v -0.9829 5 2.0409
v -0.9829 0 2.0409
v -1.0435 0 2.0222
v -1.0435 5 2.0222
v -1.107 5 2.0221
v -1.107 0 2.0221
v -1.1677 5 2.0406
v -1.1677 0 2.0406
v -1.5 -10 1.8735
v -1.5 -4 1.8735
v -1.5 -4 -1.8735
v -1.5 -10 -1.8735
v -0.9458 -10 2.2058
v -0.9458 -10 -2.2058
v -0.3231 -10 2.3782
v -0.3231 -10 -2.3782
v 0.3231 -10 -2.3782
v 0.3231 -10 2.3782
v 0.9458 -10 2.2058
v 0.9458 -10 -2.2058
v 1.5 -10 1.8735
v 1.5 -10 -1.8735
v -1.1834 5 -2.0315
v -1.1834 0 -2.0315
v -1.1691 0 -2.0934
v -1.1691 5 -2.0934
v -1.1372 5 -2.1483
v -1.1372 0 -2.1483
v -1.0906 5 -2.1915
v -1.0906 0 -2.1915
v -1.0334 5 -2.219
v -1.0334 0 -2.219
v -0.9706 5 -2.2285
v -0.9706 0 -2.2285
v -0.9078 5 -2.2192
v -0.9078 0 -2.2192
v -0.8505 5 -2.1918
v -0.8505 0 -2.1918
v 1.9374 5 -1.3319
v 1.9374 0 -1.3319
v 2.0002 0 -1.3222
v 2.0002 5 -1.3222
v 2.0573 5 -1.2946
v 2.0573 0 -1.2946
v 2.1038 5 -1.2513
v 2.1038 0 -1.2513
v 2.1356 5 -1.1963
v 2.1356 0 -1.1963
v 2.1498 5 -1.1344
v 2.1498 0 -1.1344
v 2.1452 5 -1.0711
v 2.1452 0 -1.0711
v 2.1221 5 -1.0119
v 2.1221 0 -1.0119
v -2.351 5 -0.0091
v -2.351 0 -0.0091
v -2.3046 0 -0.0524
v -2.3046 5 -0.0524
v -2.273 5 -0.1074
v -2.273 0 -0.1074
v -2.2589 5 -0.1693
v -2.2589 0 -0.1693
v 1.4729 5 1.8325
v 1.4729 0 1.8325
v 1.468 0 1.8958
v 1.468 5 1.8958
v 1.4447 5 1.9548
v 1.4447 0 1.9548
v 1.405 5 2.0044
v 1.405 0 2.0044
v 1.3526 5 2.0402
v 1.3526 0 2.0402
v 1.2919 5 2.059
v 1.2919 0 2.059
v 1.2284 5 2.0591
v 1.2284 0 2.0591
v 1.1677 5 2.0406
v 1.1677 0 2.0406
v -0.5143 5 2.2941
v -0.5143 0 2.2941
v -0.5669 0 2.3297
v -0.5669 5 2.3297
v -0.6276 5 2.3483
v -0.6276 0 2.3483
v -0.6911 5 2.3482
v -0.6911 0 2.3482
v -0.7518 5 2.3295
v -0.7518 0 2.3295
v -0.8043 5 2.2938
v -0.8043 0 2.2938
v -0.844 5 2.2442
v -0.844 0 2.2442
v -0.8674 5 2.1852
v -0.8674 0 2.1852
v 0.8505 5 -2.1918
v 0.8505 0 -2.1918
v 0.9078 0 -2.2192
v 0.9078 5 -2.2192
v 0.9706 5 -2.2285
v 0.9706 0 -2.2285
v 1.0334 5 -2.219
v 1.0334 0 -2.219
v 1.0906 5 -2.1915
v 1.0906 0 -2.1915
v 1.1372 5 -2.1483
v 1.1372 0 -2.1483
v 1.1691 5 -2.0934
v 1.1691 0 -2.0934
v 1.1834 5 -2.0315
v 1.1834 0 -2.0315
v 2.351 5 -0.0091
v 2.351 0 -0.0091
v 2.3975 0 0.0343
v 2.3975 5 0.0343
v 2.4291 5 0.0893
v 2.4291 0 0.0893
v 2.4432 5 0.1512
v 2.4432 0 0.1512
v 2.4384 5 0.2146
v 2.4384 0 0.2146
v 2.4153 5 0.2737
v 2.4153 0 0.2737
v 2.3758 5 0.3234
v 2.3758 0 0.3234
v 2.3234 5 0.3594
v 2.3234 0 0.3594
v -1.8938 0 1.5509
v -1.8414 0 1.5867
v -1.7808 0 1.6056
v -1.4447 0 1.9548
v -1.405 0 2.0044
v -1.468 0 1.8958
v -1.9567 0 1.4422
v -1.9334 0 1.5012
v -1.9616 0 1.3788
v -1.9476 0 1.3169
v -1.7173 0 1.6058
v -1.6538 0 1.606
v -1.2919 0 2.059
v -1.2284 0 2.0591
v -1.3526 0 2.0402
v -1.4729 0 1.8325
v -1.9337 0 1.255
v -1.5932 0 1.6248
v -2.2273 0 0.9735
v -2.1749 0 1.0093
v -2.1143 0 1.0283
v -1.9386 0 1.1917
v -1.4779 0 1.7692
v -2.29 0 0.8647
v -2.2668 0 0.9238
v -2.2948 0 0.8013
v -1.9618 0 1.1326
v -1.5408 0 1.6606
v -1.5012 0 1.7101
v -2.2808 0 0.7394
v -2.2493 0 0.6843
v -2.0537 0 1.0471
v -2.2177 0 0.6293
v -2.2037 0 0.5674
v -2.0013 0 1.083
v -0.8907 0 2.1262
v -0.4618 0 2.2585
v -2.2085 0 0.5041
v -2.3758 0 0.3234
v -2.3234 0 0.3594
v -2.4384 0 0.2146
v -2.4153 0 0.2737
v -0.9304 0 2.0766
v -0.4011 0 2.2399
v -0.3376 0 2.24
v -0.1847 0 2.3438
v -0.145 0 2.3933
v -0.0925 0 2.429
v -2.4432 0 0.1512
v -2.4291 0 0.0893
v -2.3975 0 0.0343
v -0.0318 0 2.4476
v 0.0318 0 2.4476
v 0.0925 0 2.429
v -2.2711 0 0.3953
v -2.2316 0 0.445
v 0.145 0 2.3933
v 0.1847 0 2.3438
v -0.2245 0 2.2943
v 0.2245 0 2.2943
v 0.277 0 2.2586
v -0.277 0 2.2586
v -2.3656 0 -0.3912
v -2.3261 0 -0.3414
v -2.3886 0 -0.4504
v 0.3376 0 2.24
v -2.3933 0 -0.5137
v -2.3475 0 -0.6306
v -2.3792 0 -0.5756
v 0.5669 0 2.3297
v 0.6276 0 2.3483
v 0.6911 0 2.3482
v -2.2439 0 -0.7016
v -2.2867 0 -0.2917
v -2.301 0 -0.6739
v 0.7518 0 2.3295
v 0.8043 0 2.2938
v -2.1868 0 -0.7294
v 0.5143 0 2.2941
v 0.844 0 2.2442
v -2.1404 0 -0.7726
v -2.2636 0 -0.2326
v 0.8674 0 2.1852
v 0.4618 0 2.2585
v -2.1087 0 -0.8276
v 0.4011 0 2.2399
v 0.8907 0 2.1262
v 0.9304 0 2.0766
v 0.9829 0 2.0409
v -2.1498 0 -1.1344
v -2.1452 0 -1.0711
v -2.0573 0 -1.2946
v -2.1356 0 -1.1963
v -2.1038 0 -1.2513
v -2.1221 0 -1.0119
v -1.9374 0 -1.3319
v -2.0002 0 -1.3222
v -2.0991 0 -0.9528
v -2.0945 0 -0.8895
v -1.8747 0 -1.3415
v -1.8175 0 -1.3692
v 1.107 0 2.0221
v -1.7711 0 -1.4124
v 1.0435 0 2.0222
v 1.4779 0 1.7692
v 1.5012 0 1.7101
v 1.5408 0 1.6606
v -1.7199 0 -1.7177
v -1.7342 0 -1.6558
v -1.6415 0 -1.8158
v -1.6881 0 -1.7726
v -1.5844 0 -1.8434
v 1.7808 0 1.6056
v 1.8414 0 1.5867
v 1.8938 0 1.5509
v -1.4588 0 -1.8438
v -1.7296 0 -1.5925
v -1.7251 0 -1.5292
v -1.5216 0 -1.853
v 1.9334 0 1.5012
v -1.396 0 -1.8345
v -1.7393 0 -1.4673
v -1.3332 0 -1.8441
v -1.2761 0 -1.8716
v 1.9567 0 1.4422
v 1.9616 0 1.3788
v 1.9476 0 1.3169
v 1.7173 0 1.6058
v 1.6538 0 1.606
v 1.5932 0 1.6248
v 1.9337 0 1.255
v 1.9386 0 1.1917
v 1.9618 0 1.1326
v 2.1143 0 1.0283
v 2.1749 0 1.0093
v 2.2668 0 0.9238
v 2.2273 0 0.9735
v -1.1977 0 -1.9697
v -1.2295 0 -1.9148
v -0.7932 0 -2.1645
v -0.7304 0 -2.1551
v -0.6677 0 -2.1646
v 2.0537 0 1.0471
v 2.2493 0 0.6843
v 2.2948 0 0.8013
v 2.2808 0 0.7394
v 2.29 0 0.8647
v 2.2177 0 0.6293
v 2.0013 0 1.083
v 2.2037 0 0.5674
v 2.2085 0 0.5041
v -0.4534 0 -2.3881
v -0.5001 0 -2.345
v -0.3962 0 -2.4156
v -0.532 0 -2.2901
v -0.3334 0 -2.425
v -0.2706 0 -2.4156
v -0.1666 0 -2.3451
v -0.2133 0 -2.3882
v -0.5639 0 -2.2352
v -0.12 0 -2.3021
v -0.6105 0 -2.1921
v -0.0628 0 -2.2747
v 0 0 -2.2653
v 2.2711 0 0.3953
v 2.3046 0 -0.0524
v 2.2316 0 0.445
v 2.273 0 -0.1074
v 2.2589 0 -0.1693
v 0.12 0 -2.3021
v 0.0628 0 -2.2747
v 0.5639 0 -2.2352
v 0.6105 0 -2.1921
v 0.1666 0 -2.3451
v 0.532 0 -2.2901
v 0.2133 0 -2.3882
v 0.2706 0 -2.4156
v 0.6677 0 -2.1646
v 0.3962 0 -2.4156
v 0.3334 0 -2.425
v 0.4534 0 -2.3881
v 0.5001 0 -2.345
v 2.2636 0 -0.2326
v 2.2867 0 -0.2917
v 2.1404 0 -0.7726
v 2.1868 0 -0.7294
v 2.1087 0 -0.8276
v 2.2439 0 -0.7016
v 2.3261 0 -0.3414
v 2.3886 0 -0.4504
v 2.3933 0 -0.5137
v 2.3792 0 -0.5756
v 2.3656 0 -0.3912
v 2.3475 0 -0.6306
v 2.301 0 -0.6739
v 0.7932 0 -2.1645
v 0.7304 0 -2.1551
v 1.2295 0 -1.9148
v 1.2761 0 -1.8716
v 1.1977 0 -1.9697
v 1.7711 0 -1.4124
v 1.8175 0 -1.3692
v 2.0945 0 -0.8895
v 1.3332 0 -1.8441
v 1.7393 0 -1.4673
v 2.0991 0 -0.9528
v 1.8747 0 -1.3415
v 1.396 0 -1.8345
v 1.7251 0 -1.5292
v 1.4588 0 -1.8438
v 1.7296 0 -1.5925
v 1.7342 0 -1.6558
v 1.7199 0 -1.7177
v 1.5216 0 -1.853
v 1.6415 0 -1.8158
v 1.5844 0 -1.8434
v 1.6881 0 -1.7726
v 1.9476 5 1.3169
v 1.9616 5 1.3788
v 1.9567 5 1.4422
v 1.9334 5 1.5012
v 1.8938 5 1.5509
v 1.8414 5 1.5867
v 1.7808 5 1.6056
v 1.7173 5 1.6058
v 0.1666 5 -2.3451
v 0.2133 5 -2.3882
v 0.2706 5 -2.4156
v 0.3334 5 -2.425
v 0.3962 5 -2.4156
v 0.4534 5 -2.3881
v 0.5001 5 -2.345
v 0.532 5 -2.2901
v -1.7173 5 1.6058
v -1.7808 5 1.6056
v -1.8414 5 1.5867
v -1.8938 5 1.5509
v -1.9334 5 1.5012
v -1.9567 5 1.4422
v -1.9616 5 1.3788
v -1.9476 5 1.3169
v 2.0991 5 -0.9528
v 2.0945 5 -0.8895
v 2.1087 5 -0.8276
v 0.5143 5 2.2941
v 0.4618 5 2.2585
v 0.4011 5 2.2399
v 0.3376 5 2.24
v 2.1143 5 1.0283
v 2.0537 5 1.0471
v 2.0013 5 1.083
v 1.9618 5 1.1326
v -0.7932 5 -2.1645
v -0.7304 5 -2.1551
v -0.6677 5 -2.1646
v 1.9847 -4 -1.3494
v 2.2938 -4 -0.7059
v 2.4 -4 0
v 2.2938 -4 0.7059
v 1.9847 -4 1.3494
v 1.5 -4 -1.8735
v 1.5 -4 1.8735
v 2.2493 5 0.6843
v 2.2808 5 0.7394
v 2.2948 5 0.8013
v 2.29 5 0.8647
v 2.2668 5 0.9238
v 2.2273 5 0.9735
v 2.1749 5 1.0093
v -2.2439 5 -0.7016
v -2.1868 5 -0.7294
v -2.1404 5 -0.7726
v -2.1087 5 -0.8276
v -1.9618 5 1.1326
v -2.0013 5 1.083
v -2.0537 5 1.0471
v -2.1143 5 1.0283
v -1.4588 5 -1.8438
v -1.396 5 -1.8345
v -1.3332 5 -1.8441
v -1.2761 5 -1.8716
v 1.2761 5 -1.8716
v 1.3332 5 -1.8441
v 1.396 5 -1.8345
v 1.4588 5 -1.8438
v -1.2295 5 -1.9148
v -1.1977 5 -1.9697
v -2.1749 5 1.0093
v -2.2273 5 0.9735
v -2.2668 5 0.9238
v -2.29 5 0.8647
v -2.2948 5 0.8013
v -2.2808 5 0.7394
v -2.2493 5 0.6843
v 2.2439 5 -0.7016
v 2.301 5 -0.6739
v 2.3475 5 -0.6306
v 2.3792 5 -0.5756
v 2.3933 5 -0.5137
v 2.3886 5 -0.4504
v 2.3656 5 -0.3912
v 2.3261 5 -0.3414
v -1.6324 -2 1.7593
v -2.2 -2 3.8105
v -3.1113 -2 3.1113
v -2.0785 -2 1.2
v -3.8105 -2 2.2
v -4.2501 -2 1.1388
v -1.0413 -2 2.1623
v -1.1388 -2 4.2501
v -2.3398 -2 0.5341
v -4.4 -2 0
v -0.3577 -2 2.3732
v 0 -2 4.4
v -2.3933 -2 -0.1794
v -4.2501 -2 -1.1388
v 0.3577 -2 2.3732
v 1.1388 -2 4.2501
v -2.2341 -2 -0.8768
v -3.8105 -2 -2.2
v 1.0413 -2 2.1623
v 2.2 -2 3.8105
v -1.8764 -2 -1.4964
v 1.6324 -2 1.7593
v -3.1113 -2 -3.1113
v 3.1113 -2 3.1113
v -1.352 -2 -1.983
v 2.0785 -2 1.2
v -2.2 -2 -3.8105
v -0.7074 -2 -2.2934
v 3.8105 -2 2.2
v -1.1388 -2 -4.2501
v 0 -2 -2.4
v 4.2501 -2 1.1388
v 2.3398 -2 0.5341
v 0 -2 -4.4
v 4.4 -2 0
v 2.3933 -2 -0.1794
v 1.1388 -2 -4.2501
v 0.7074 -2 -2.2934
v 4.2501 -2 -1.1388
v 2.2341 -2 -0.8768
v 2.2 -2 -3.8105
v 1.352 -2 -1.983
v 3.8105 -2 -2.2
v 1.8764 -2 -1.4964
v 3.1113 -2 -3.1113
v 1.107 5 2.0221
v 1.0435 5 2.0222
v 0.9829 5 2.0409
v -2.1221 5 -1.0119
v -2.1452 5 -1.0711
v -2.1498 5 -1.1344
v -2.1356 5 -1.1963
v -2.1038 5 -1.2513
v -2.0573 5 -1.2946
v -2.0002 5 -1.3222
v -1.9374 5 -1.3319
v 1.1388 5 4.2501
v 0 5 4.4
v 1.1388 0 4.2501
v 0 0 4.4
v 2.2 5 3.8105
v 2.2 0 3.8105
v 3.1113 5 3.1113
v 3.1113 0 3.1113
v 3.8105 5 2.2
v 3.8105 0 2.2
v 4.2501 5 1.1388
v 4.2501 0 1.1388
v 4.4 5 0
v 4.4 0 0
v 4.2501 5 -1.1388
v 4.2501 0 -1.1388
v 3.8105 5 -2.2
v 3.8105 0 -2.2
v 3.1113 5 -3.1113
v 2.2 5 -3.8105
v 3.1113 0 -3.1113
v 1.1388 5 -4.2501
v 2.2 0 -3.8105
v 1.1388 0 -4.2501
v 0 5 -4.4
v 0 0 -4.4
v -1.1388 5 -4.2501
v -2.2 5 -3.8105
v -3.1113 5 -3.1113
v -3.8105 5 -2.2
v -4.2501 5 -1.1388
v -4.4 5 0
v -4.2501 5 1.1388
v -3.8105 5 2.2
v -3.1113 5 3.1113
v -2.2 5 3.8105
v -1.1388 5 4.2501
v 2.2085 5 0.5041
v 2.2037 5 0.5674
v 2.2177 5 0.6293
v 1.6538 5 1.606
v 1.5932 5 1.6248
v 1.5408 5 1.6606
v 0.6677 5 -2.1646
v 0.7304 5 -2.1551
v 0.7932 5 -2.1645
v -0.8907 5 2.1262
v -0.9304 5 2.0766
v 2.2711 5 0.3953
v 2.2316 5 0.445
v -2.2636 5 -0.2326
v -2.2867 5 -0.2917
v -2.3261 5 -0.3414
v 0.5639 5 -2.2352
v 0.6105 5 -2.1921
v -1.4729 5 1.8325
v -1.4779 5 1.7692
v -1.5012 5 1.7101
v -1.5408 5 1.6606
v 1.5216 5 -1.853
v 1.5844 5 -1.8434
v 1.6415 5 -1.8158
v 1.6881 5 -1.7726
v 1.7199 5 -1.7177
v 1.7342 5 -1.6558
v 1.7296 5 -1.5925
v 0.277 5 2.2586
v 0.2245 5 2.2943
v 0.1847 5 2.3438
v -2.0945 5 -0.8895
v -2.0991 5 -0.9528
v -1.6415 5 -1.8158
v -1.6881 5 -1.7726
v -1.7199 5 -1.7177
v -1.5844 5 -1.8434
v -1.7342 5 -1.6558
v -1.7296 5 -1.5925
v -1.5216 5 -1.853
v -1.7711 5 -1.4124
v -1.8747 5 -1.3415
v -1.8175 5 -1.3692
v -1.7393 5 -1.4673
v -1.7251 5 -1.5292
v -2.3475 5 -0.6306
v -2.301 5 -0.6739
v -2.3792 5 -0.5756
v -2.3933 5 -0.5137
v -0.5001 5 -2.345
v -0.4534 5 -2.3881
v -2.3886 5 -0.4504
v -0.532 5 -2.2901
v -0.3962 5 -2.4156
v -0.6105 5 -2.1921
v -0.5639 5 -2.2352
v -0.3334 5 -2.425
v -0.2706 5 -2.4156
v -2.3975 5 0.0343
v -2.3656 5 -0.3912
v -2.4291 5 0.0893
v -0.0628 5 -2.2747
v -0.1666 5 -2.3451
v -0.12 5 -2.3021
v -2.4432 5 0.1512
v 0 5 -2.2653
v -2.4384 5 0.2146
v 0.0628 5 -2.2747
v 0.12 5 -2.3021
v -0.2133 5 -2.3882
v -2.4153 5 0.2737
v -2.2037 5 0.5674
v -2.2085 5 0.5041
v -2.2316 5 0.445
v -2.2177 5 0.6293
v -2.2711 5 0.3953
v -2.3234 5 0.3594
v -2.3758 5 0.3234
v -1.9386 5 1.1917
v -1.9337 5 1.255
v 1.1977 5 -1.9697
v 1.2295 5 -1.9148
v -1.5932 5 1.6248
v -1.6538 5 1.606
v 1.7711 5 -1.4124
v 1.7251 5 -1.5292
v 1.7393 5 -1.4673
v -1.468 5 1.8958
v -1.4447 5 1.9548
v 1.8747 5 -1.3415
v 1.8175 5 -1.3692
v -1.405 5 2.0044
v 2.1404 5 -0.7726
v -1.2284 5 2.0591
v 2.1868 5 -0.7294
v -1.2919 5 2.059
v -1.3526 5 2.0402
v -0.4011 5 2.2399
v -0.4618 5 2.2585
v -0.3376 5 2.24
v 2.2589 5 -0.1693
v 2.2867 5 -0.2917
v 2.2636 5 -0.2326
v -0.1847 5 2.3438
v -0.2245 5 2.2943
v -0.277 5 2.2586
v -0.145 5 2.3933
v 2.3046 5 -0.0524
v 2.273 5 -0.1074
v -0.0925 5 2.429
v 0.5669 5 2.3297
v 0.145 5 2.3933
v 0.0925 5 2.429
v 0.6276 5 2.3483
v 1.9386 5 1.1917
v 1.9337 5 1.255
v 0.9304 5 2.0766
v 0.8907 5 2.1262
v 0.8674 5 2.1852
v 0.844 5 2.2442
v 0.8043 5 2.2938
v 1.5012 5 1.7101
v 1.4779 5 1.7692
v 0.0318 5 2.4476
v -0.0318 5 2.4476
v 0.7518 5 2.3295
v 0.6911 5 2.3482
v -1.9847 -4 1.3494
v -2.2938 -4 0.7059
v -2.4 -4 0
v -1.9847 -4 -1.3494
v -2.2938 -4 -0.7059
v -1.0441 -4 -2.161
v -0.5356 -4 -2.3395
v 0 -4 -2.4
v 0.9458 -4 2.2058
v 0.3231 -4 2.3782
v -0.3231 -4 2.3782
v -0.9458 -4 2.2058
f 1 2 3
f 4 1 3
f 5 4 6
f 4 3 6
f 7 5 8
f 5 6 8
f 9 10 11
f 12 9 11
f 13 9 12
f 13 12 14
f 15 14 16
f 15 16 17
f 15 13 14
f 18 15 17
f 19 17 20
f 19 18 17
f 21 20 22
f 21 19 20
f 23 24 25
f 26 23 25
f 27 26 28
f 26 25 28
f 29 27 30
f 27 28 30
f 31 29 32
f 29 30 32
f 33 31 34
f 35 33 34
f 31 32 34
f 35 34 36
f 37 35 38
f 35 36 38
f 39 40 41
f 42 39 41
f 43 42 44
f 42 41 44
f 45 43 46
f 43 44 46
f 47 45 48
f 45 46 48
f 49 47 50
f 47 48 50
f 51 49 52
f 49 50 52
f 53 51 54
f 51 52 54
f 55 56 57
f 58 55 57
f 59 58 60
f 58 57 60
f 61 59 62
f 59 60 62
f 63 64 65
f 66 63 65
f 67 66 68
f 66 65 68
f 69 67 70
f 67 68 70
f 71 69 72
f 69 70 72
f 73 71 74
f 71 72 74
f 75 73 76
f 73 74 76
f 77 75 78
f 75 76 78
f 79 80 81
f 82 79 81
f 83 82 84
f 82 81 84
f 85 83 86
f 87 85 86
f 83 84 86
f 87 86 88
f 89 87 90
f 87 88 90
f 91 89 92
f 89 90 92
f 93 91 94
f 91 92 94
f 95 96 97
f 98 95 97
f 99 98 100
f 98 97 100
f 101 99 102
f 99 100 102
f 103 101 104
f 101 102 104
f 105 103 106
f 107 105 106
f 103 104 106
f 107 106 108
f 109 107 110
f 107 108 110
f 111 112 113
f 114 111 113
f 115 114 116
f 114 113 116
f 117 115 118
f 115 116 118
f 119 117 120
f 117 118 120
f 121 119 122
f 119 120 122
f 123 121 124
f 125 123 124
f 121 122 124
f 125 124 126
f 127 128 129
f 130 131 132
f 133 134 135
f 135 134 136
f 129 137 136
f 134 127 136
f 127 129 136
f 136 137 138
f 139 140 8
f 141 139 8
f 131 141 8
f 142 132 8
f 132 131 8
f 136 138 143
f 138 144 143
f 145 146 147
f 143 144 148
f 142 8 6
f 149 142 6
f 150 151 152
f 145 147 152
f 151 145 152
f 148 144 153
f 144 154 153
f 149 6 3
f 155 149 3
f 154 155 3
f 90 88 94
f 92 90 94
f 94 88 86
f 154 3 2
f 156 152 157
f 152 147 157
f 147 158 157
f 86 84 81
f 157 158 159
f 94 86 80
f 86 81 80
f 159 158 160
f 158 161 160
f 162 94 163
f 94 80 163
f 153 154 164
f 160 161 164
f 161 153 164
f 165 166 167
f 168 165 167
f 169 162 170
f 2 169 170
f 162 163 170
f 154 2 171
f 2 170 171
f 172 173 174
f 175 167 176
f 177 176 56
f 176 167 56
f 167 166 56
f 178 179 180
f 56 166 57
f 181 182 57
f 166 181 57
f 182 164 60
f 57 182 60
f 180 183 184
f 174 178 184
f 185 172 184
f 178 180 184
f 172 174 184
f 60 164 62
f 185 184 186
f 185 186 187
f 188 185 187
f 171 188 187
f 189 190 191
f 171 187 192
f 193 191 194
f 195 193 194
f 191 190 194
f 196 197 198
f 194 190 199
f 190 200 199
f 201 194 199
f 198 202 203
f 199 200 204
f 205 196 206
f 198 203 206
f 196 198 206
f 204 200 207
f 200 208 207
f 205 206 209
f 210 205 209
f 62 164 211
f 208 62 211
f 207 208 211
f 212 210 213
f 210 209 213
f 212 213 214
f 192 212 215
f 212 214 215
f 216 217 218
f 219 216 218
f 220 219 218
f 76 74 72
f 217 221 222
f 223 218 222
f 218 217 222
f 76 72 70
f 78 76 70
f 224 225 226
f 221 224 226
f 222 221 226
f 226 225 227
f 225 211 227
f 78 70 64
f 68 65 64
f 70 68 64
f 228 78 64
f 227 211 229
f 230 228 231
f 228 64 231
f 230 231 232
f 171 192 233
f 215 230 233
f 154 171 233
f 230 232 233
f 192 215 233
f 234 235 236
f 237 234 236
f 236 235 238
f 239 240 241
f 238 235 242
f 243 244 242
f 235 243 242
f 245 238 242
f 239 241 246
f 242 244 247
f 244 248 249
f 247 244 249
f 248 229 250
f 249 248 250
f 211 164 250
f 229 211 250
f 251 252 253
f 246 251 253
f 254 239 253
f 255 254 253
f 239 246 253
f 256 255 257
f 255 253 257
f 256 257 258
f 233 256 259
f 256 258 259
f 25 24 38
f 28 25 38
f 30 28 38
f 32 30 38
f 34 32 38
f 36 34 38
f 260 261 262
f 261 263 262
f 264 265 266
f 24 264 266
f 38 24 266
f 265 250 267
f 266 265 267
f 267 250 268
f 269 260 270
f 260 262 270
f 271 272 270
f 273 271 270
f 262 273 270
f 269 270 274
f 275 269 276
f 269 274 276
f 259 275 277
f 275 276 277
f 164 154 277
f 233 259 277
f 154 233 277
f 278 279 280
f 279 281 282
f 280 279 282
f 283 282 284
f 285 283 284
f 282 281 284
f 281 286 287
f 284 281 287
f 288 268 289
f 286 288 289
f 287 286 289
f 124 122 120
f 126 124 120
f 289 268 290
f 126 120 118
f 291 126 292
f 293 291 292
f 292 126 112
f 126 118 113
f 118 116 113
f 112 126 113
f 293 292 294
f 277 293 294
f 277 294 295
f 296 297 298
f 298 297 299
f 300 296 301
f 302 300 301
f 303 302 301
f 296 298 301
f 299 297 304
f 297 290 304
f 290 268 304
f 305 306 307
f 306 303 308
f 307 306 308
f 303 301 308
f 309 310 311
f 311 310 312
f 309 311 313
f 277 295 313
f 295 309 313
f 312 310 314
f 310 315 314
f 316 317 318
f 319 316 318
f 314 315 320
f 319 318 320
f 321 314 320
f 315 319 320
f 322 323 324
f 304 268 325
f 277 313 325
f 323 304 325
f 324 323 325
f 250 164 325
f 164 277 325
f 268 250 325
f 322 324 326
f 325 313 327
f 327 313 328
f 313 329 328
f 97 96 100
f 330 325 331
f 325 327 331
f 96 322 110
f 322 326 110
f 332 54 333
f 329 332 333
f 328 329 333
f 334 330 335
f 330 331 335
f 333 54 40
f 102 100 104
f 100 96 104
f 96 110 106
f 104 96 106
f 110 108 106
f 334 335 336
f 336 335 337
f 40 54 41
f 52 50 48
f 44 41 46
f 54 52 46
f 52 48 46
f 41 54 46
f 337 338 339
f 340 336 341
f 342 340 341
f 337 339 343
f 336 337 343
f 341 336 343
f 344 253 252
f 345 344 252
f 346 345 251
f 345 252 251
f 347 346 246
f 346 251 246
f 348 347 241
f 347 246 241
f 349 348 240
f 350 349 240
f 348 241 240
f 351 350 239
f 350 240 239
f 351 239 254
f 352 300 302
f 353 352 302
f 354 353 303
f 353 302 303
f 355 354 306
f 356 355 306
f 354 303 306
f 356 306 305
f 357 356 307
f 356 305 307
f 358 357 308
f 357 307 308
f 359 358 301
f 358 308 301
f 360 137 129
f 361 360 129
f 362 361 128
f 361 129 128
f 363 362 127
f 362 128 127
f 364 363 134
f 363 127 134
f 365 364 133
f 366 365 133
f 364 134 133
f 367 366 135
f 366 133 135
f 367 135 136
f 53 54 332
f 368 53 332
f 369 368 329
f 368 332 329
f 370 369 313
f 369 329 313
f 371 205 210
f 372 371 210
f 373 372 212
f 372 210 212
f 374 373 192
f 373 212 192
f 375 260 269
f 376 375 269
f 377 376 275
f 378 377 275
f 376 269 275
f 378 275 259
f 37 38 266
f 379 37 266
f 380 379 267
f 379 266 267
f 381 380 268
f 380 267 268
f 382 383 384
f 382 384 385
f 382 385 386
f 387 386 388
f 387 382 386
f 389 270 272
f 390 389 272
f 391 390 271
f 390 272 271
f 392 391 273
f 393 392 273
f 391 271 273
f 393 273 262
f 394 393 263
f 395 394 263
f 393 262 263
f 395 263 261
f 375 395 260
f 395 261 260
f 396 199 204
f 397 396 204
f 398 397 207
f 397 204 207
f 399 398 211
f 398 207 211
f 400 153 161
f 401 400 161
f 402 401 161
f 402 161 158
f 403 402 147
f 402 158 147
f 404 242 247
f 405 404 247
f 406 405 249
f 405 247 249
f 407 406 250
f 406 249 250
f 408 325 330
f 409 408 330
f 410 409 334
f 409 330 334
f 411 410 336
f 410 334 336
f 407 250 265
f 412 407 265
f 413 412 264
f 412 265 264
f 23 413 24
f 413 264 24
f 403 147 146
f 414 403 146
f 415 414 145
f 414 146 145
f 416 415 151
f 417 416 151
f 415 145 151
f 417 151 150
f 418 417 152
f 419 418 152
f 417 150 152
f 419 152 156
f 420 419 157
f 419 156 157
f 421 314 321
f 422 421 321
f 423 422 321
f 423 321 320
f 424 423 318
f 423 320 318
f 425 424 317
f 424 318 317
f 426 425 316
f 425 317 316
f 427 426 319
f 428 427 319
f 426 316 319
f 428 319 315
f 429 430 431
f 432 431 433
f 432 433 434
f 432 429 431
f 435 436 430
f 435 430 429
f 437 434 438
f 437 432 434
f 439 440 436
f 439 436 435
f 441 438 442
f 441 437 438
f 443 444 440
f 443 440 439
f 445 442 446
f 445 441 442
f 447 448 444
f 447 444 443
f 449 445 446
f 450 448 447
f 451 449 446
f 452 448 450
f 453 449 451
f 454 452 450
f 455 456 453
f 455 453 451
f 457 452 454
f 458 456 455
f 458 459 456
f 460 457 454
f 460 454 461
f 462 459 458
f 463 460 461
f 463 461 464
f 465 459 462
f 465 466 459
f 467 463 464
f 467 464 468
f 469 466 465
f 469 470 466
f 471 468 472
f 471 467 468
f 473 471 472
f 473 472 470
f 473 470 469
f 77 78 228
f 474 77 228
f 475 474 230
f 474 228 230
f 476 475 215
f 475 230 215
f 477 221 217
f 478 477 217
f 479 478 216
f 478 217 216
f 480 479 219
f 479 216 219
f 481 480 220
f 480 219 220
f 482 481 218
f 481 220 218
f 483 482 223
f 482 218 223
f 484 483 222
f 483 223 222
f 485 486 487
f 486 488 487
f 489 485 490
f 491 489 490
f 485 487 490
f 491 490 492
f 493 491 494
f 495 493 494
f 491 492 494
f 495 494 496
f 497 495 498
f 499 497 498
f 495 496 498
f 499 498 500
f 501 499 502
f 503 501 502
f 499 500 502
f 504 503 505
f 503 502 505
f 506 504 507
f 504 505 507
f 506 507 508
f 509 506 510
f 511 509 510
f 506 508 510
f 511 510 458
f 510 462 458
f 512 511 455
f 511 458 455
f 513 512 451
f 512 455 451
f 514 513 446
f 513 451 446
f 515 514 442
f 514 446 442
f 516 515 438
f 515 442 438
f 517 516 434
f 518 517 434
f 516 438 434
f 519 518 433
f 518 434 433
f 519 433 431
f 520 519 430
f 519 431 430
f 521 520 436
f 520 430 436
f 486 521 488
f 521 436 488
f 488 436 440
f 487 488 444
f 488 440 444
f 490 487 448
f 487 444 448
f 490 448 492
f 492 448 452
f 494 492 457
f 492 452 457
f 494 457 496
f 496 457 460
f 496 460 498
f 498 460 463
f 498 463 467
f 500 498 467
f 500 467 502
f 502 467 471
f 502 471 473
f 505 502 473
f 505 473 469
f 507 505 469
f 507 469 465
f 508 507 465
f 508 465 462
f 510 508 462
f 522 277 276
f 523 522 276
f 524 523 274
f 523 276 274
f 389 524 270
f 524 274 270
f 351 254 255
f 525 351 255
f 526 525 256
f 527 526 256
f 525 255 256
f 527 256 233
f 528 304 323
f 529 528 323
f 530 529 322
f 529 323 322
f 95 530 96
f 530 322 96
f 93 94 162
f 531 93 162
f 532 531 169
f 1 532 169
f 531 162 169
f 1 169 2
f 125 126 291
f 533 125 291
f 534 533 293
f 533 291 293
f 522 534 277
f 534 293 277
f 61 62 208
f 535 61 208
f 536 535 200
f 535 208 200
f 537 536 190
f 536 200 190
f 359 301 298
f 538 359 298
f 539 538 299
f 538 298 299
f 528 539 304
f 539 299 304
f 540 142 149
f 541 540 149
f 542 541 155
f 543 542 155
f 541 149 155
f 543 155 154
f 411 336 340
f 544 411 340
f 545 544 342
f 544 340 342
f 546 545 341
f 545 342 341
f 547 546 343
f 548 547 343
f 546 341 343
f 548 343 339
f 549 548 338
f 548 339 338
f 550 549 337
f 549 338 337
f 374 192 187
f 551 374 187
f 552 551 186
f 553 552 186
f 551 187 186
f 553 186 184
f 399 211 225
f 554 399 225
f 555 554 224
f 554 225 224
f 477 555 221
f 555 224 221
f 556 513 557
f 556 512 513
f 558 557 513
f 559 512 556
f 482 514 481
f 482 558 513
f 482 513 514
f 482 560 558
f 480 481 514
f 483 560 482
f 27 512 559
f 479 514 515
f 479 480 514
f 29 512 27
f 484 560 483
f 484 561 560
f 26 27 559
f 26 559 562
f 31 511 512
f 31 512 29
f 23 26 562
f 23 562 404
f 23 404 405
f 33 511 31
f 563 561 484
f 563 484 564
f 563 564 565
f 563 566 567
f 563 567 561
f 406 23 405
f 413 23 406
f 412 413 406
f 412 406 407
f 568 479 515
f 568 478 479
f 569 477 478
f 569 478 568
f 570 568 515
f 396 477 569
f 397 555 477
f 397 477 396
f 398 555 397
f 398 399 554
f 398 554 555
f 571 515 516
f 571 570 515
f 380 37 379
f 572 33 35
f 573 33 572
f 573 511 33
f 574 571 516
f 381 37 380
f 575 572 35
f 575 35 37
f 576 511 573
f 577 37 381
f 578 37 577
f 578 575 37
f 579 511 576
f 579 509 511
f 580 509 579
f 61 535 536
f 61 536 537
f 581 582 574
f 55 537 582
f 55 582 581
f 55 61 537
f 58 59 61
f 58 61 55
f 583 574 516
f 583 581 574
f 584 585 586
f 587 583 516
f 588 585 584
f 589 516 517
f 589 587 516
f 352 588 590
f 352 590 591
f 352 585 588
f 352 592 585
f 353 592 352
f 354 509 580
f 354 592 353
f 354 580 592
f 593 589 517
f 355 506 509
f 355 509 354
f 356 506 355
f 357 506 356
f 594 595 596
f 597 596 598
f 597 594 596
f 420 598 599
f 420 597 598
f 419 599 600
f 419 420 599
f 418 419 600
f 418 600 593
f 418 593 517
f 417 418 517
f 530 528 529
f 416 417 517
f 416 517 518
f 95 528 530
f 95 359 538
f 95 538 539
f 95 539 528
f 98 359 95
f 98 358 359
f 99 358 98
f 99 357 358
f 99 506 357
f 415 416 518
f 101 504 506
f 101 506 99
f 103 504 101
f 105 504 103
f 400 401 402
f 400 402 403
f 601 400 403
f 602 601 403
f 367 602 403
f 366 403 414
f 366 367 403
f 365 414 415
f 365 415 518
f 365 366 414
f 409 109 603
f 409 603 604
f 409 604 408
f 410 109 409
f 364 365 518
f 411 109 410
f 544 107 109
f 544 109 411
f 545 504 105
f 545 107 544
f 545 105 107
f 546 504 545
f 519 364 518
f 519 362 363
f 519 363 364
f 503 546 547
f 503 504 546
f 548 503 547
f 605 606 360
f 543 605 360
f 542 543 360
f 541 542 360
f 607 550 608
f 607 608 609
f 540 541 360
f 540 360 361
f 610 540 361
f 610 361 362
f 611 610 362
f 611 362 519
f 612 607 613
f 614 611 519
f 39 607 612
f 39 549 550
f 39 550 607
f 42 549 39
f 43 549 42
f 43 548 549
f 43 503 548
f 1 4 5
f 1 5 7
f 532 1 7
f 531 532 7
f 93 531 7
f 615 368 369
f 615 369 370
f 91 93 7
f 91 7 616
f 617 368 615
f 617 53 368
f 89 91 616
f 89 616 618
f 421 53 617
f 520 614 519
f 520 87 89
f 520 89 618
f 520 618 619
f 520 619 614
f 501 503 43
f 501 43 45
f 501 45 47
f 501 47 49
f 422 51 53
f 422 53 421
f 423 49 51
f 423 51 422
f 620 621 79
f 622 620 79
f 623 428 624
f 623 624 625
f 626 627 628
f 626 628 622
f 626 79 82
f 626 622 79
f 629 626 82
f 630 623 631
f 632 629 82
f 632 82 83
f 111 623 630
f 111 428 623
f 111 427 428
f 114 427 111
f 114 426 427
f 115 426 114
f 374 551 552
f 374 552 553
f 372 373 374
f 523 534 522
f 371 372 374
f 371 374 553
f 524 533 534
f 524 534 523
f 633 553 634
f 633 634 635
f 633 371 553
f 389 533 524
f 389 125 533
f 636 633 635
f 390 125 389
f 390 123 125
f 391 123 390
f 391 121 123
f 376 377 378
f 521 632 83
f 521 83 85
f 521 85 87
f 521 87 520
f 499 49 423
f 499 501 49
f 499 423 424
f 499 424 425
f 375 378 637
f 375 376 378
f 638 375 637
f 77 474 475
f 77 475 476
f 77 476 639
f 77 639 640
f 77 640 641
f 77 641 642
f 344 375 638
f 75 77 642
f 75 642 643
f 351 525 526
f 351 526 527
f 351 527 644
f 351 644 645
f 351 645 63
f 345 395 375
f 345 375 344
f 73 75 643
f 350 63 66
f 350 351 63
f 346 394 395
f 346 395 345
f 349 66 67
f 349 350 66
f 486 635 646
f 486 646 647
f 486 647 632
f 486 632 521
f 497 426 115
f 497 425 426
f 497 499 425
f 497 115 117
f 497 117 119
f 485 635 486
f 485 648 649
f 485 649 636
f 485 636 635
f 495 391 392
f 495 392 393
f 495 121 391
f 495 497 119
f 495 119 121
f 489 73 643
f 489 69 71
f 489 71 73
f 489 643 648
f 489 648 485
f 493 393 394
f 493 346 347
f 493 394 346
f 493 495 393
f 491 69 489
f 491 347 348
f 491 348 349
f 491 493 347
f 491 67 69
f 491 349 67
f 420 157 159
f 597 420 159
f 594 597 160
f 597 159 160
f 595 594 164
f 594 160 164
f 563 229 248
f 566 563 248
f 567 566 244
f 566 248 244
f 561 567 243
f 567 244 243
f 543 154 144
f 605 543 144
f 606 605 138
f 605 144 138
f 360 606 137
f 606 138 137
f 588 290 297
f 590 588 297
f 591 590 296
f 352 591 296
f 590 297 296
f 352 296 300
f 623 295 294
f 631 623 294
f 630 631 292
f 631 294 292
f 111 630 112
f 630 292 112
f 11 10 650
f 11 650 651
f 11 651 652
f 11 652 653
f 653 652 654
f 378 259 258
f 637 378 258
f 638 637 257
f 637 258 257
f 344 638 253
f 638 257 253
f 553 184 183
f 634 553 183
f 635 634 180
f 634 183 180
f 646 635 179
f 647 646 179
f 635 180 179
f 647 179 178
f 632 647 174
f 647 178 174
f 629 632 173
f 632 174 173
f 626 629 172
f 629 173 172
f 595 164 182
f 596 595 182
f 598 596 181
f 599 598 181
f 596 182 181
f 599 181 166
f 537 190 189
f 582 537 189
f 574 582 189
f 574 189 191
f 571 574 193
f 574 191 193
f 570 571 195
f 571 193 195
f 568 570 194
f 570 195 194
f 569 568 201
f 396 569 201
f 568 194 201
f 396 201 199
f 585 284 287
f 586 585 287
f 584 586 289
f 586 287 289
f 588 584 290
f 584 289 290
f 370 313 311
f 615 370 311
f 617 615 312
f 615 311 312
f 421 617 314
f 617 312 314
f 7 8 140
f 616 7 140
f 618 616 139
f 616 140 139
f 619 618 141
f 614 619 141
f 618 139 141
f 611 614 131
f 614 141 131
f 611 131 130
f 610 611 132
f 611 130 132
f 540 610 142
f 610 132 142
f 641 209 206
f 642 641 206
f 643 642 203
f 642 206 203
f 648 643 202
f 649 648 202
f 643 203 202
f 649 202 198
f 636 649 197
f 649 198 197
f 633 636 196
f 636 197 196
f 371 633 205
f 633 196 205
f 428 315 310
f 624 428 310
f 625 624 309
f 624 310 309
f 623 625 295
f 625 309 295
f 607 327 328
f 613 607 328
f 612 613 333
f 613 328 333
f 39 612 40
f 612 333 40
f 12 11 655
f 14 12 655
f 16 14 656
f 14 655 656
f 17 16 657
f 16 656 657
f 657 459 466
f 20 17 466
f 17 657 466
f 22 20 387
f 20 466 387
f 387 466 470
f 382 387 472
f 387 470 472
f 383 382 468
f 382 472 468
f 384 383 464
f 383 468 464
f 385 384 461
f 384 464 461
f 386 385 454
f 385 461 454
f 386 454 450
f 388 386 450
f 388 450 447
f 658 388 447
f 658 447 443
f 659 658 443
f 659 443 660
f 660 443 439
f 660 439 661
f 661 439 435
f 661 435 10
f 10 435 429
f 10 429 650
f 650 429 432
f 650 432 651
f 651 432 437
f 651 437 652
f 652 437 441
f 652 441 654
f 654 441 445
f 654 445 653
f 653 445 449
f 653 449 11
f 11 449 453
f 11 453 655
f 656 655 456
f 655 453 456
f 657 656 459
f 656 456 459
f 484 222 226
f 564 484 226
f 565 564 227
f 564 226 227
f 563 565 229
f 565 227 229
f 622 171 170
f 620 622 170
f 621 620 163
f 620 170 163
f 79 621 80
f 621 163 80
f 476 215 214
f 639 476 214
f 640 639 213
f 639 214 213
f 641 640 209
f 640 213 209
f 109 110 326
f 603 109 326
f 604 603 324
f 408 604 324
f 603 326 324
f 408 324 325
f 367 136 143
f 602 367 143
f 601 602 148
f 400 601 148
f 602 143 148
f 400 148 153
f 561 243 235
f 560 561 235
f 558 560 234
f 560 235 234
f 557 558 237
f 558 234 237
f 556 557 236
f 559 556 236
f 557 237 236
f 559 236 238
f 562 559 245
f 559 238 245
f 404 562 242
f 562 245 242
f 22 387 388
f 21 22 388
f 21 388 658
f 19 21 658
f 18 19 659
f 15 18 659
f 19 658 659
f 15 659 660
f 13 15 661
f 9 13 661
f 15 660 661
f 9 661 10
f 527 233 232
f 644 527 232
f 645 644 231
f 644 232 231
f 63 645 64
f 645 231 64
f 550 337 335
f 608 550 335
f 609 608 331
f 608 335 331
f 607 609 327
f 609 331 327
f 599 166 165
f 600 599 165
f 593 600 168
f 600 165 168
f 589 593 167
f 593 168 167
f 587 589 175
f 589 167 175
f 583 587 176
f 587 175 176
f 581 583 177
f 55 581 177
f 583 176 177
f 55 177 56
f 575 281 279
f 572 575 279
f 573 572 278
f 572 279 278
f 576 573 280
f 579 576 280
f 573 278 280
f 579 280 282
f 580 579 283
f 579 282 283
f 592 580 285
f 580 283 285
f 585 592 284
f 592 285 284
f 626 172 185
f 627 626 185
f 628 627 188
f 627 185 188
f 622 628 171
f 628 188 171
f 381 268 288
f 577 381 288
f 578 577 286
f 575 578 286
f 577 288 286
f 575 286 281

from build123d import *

# Parameters (mm, degrees)
SKETCH1_R           = 3.95
BOSS_EXTRUDE1_DEPTH = 5
SKETCH2_R           = 4.4
BOSS_EXTRUDE2_DEPTH = 2
SKETCH4_R           = 2.4
BOSS_EXTRUDE3_DEPTH = 2
BOSS_EXTRUDE4_DEPTH = 6
SKETCH6_R           = 4.4
SKETCH6_R_2         = 3.95
BOSS_EXTRUDE5_DEPTH = 5


with BuildPart() as part:
    # Sketch1 → Boss-Extrude1 (new body)
    with BuildSketch(Plane(origin=(0, 0, 0), x_dir=(1, 0, 0), z_dir=(0, 1, 0))):
        with Locations(Location((0, 0, 0), (0, 0, 270))):
            Circle(SKETCH1_R)
        with BuildLine():
            ThreePointArc((-0.166646614, 2.345141313), (-0.092401566, 2.286261662), (0, 2.2652595))
            ThreePointArc((0, 2.2652595), (0.092401566, 2.286261662), (0.166646614, 2.345141313))
            ThreePointArc((0.166646614, 2.345141313), (0.365153552, 2.422635524), (0.531999564, 2.290073216))
            ThreePointArc((0.531999564, 2.290073216), (0.585591031, 2.211925311), (0.667696959, 2.164620376))
            ThreePointArc((0.667696959, 2.164620376), (0.762183879, 2.157453631), (0.850485509, 2.191833312))
            ThreePointArc((0.850485509, 2.191833312), (1.063015161, 2.207373726), (1.183375246, 2.031522064))
            ThreePointArc((1.183375246, 2.031522064), (1.211551295, 1.941049689), (1.276066113, 1.871645232))
            ThreePointArc((1.276066113, 1.871645232), (1.364242809, 1.836946378), (1.458755034, 1.843771303))
            ThreePointArc((1.458755034, 1.843771303), (1.666423208, 1.795977086), (1.729602845, 1.592461261))
            ThreePointArc((1.729602845, 1.592461261), (1.72985991, 1.497703284), (1.771051193, 1.412366197))
            ThreePointArc((1.771051193, 1.412366197), (1.845082779, 1.353218377), (1.937407773, 1.331882123))
            ThreePointArc((1.937407773, 1.331882123), (2.121762239, 1.225), (2.12214764, 1.011903287))
            ThreePointArc((2.12214764, 1.011903287), (2.094462881, 0.92127937), (2.108670602, 0.827592226))
            ThreePointArc((2.108670602, 0.827592226), (2.161979047, 0.749250985), (2.243913329, 0.701649371))
            ThreePointArc((2.243913329, 0.701649371), (2.388573385, 0.545176288), (2.326130305, 0.341433266))
            ThreePointArc((2.326130305, 0.341433266), (2.272963633, 0.262995741), (2.258925375, 0.169283054))
            ThreePointArc((2.258925375, 0.169283054), (2.286773988, 0.078709355), (2.351037339, 0.009071994))
            ThreePointArc((2.351037339, 0.009071994), (2.443149303, -0.183088729), (2.323426084, -0.3593746))
            ThreePointArc((2.323426084, -0.3593746), (2.249501592, -0.418656214), (2.208464714, -0.504067659))
            ThreePointArc((2.208464714, -0.504067659), (2.208379026, -0.598825947), (2.249261363, -0.68431147))
            ThreePointArc((2.249261363, -0.68431147), (2.280640684, -0.89508551), (2.114275259, -1.028250455))
            ThreePointArc((2.114275259, -1.028250455), (2.026161462, -1.063108727), (1.961772273, -1.13262975))
            ThreePointArc((1.961772273, -1.13262975), (1.933759896, -1.223152935), (1.947628645, -1.316890857))
            ThreePointArc((1.947628645, -1.316890857), (1.915487132, -1.527550015), (1.717261799, -1.605761745))
            ThreePointArc((1.717261799, -1.605761745), (1.622787995, -1.613099364), (1.540767756, -1.660552716))
            ThreePointArc((1.540767756, -1.660552716), (1.487317713, -1.738797417), (1.472940575, -1.832458712))
            ThreePointArc((1.472940575, -1.832458712), (1.380134142, -2.024284997), (1.167662092, -2.040594058))
            ThreePointArc((1.167662092, -2.040594058), (1.075222693, -2.019759044), (0.982859262, -2.040928287))
            ThreePointArc((0.982859262, -2.040928287), (0.908720824, -2.099942118), (0.86737527, -2.185204569))
            ThreePointArc((0.86737527, -2.185204569), (0.722150177, -2.341153374), (0.514310485, -2.294110633))
            ThreePointArc((0.514310485, -2.294110633), (0.432119136, -2.246954269), (0.337619409, -2.239958423))
            ThreePointArc((0.337619409, -2.239958423), (0.249380102, -2.274497747), (0.184739867, -2.343785411))
            ThreePointArc((0.184739867, -2.343785411), (0, -2.45), (-0.184739867, -2.343785411))
            ThreePointArc((-0.184739867, -2.343785411), (-0.249380102, -2.274497747), (-0.337619409, -2.239958423))
            ThreePointArc((-0.337619409, -2.239958423), (-0.432119136, -2.246954269), (-0.514310485, -2.294110633))
            ThreePointArc((-0.514310485, -2.294110633), (-0.722150177, -2.341153374), (-0.86737527, -2.185204569))
            ThreePointArc((-0.86737527, -2.185204569), (-0.908720824, -2.099942118), (-0.982859262, -2.040928287))
            ThreePointArc((-0.982859262, -2.040928287), (-1.075222693, -2.019759044), (-1.167662092, -2.040594058))
            ThreePointArc((-1.167662092, -2.040594058), (-1.380134142, -2.024284997), (-1.472940575, -1.832458712))
            ThreePointArc((-1.472940575, -1.832458712), (-1.487317713, -1.738797417), (-1.540767756, -1.660552716))
            ThreePointArc((-1.540767756, -1.660552716), (-1.622787995, -1.613099364), (-1.717261799, -1.605761745))
            ThreePointArc((-1.717261799, -1.605761745), (-1.915487132, -1.527550015), (-1.947628645, -1.316890857))
            ThreePointArc((-1.947628645, -1.316890857), (-1.933759896, -1.223152935), (-1.961772273, -1.13262975))
            ThreePointArc((-1.961772273, -1.13262975), (-2.026161462, -1.063108727), (-2.114275259, -1.028250455))
            ThreePointArc((-2.114275259, -1.028250455), (-2.280640684, -0.89508551), (-2.249261363, -0.68431147))
            ThreePointArc((-2.249261363, -0.68431147), (-2.208379026, -0.598825947), (-2.208464714, -0.504067659))
            ThreePointArc((-2.208464714, -0.504067659), (-2.249501592, -0.418656214), (-2.323426084, -0.3593746))
            ThreePointArc((-2.323426084, -0.3593746), (-2.443149303, -0.183088729), (-2.351037339, 0.009071994))
            ThreePointArc((-2.351037339, 0.009071994), (-2.286773988, 0.078709355), (-2.258925375, 0.169283054))
            ThreePointArc((-2.258925375, 0.169283054), (-2.272963633, 0.262995741), (-2.326130305, 0.341433266))
            ThreePointArc((-2.326130305, 0.341433266), (-2.388573385, 0.545176288), (-2.243913329, 0.701649371))
            ThreePointArc((-2.243913329, 0.701649371), (-2.161979047, 0.749250985), (-2.108670602, 0.827592226))
            ThreePointArc((-2.108670602, 0.827592226), (-2.094462881, 0.92127937), (-2.12214764, 1.011903287))
            ThreePointArc((-2.12214764, 1.011903287), (-2.121762239, 1.225), (-1.937407773, 1.331882123))
            ThreePointArc((-1.937407773, 1.331882123), (-1.845082779, 1.353218377), (-1.771051193, 1.412366197))
            ThreePointArc((-1.771051193, 1.412366197), (-1.72985991, 1.497703284), (-1.729602845, 1.592461261))
            ThreePointArc((-1.729602845, 1.592461261), (-1.666423208, 1.795977086), (-1.458755034, 1.843771303))
            ThreePointArc((-1.458755034, 1.843771303), (-1.364242809, 1.836946378), (-1.276066113, 1.871645232))
            ThreePointArc((-1.276066113, 1.871645232), (-1.211551295, 1.941049689), (-1.183375246, 2.031522064))
            ThreePointArc((-1.183375246, 2.031522064), (-1.063015161, 2.207373726), (-0.850485509, 2.191833312))
            ThreePointArc((-0.850485509, 2.191833312), (-0.762183879, 2.157453631), (-0.667696959, 2.164620376))
            ThreePointArc((-0.667696959, 2.164620376), (-0.585591031, 2.211925311), (-0.531999564, 2.290073216))
            ThreePointArc((-0.531999564, 2.290073216), (-0.365153552, 2.422635524), (-0.166646614, 2.345141313))
        make_face(mode=Mode.SUBTRACT)
    extrude(amount=BOSS_EXTRUDE1_DEPTH)

    # Sketch2 → Boss-Extrude2 (add)
    with BuildSketch(Plane.XZ):
        with Locations(Location((0, 0, 0), (0, 0, 270))):
            Circle(SKETCH2_R)
    extrude(amount=BOSS_EXTRUDE2_DEPTH)

    # Sketch4 → Boss-Extrude3 (add)
    with BuildSketch(Plane.XZ.offset(2)):
        with Locations(Location((0, 0, 0), (0, 0, 270))):
            Circle(SKETCH4_R)
    extrude(amount=BOSS_EXTRUDE3_DEPTH)

    # Sketch5 → Boss-Extrude4 (add)
    with BuildSketch(Plane.XZ.offset(4)):
        with BuildLine():
            ThreePointArc((1.5, 1.8734994), (0, 2.4), (-1.5, 1.8734994))
            Line((-1.5, 1.8734994), (-1.5, -1.8734994))
            ThreePointArc((-1.5, -1.8734994), (0, -2.4), (1.5, -1.8734994))
            Line((1.5, -1.8734994), (1.5, 1.8734994))
        make_face()
    extrude(amount=BOSS_EXTRUDE4_DEPTH)

    # Sketch6 → Boss-Extrude5 (add)
    with BuildSketch(Plane(origin=(0, 0, 0), x_dir=(1, 0, 0), z_dir=(0, 1, 0))):
        with Locations(Location((0, 0, 0), (0, 0, 270))):
            Circle(SKETCH6_R)
        Circle(SKETCH6_R_2, mode=Mode.SUBTRACT)
    extrude(amount=BOSS_EXTRUDE5_DEPTH)


solid = part.part
